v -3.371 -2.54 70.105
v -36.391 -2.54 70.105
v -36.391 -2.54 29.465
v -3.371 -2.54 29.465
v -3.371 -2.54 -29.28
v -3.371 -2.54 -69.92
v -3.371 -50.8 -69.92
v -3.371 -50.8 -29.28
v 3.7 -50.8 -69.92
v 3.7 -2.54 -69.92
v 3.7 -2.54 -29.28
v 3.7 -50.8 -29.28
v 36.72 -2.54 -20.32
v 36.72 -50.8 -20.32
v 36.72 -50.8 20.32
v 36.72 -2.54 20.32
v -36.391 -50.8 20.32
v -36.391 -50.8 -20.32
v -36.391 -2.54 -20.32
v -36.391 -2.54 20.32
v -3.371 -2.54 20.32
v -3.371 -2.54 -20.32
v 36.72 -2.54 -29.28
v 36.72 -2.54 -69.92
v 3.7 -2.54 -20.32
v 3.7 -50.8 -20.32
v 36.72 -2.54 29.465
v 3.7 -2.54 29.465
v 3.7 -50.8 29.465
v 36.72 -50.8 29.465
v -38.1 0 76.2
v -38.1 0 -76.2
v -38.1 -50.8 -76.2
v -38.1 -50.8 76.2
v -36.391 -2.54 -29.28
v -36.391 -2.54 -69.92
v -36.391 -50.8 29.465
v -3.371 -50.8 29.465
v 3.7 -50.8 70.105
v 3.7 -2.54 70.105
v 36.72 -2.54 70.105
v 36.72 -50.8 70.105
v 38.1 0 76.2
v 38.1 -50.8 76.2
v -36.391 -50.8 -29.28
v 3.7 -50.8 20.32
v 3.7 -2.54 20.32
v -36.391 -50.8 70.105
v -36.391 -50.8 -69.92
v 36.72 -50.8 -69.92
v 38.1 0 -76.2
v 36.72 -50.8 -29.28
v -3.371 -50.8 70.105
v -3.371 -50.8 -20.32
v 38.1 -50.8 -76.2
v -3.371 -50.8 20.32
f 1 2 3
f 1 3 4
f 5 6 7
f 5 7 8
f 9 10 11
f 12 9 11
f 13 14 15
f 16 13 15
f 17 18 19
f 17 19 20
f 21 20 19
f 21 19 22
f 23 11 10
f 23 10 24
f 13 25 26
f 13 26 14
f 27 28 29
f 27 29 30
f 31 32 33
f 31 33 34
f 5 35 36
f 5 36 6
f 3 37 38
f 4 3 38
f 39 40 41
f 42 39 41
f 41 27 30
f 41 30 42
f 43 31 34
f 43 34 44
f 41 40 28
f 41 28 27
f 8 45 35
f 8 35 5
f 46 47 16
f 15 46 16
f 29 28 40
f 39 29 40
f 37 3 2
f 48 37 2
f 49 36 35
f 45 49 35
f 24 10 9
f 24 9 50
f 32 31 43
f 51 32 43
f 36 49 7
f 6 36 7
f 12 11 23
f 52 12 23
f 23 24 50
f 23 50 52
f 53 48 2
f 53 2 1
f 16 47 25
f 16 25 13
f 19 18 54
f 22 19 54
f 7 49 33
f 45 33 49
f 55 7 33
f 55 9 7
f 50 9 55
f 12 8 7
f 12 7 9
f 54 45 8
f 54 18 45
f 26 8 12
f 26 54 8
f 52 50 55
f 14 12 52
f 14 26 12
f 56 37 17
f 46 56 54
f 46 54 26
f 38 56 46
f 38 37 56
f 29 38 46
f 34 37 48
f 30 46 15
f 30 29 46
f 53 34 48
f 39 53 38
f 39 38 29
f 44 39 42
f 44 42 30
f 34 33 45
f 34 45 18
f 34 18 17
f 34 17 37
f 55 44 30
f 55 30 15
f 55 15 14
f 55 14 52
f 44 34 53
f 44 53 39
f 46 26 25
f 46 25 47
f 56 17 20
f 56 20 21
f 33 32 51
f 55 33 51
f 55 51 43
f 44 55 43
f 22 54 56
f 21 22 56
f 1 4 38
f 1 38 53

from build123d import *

# Parameters (mm, degrees)
F0_W     = 76.2
F0_H     = 152.4
F1_DEPTH = 50.8
F2_W     = 33.02
F2_H     = 40.64
F3_DEPTH = 48.26


with BuildPart() as f1:
    # F0 (on Front) → F1 (new body)
    with BuildSketch(Plane.XZ):
        Rectangle(F0_W, F0_H)
    extrude(amount=F1_DEPTH)

    # F2 (on face) → F3 (cut)
    with BuildSketch(Plane.XZ.offset(50.8)):
        with Locations((-19.880973, 49.785413)):
            Rectangle(F2_W, F2_H)
        with Locations((20.210451, 49.785413)):
            Rectangle(F2_W, F2_H)
        with Locations((-19.880973, 0)):
            Rectangle(F2_W, F2_H)
        with Locations((20.210451, 0)):
            Rectangle(F2_W, F2_H)
        with Locations((-19.880973, -49.599994)):
            Rectangle(F2_W, F2_H)
        with Locations((20.210451, -49.599994)):
            Rectangle(F2_W, F2_H)
    extrude(amount=-F3_DEPTH, mode=Mode.SUBTRACT)


solid = f1.part
